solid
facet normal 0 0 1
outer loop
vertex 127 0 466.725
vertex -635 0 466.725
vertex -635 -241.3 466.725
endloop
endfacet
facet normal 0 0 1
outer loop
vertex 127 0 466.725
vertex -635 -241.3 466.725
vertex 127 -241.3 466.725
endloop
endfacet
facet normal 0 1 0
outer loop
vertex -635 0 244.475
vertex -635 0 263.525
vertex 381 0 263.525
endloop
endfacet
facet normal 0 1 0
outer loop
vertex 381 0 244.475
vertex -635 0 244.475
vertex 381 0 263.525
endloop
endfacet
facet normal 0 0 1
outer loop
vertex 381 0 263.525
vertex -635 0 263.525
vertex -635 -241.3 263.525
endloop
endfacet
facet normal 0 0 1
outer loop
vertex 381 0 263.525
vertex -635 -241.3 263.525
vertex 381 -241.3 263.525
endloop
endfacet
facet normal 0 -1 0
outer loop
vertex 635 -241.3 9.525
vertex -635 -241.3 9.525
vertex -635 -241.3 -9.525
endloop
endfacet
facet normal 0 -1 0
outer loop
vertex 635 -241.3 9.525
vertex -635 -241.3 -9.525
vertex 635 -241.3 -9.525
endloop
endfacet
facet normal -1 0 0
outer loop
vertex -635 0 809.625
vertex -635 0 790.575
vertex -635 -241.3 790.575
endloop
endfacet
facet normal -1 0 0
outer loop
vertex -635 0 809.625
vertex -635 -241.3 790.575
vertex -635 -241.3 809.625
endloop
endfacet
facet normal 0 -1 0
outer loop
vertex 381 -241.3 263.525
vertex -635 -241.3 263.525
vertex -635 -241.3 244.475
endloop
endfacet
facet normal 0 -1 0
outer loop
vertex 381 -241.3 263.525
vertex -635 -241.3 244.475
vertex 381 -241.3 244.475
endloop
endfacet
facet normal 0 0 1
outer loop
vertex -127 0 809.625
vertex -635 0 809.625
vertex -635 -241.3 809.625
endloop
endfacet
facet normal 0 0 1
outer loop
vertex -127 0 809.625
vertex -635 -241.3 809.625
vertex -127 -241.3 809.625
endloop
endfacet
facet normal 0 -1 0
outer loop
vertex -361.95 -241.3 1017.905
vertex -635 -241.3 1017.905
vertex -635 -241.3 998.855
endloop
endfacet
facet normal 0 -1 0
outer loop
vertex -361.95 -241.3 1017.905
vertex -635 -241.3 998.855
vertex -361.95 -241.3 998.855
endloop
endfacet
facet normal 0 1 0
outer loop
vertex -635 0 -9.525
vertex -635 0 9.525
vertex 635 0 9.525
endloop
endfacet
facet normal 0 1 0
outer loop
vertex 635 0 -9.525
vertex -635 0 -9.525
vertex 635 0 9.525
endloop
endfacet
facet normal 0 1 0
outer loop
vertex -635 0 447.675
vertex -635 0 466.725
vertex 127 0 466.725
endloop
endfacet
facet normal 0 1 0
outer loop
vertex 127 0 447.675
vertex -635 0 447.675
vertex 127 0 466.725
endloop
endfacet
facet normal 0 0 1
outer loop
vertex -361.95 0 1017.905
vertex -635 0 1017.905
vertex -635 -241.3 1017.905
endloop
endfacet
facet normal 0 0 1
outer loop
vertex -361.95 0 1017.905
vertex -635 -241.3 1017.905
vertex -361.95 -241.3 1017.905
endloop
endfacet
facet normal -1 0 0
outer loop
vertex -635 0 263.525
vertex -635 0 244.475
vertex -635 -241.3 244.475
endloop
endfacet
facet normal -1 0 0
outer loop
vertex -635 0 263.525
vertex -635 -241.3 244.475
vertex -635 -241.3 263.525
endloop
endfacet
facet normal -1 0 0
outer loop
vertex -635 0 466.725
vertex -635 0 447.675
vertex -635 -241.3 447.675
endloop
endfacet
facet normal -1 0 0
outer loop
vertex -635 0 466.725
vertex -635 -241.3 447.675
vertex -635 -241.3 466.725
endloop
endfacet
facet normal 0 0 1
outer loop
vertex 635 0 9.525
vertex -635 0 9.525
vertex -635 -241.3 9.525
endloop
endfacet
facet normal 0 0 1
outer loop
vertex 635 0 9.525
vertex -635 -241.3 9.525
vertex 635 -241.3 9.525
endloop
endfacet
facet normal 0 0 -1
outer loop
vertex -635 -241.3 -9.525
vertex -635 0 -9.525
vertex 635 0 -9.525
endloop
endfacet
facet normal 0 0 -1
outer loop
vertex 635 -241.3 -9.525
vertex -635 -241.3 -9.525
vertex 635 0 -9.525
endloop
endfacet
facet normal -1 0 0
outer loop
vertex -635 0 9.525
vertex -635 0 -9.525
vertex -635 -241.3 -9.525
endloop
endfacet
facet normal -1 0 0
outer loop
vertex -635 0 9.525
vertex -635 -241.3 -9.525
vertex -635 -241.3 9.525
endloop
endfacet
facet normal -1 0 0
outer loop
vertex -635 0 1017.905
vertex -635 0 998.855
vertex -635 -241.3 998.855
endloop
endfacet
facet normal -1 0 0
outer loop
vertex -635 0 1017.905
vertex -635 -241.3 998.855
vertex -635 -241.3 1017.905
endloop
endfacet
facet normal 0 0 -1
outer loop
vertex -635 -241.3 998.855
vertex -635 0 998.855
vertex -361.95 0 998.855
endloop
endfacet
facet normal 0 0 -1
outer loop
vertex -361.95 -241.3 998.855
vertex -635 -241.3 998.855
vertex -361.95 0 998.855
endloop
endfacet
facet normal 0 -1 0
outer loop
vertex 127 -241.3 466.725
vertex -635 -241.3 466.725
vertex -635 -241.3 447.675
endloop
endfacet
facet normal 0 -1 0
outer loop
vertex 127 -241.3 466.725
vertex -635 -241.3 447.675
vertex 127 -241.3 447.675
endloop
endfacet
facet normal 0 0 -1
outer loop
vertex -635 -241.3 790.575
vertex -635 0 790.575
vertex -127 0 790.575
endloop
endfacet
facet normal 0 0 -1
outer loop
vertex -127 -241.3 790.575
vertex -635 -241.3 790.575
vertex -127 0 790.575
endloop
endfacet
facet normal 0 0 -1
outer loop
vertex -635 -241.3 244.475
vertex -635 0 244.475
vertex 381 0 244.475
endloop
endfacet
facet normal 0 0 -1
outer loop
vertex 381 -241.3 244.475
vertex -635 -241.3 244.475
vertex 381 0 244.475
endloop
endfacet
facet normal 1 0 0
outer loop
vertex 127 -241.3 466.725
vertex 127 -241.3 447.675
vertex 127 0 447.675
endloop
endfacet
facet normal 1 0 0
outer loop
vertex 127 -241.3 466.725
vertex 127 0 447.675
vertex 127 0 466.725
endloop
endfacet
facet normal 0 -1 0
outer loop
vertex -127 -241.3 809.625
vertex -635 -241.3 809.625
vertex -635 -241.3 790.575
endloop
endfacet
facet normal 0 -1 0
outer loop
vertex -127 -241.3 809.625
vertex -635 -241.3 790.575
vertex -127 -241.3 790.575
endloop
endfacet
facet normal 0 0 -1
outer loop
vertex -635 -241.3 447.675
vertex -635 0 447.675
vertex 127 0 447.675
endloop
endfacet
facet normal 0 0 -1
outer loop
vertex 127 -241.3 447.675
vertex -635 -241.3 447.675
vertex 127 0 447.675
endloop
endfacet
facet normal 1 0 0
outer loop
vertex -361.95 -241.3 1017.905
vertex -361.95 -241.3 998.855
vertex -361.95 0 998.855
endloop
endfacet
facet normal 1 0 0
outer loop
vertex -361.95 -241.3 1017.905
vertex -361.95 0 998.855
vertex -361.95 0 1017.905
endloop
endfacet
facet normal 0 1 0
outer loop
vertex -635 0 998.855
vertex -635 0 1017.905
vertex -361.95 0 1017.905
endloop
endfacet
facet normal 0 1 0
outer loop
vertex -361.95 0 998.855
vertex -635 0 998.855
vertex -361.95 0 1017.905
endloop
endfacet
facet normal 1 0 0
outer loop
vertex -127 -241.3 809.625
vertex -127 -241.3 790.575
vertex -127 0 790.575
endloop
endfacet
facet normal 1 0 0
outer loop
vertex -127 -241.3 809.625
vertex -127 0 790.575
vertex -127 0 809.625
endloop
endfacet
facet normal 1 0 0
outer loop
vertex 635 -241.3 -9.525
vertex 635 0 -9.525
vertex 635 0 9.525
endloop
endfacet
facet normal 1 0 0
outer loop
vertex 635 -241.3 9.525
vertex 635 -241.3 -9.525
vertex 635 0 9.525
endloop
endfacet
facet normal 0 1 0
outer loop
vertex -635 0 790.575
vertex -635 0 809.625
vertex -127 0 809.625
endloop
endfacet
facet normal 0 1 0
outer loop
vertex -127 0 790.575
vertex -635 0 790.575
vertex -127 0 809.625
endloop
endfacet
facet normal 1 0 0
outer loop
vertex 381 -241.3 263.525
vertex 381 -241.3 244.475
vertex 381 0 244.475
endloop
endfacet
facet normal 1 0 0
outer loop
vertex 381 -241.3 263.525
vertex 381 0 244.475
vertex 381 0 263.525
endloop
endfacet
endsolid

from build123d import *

# Parameters (mm, degrees)
F0_W      = 1270
F0_H      = 19.05
F1_DEPTH  = 241.3
F3_W      = 254
F3_H      = 19.05
F4_DEPTH  = 241.301
F6_W      = 254
F6_H      = 19.05
F7_DEPTH  = 241.301
F9_W      = 254
F9_H      = 19.05
F10_DEPTH = 241.301
F12_W     = 234.95
F12_H     = 19.05
F13_DEPTH = 241.301


with BuildPart() as f1:
    # F0 (on Front) → F1 (new body)
    with BuildSketch(Plane.XZ):
        Rectangle(F0_W, F0_H)
    extrude(amount=F1_DEPTH)


with BuildPart() as f2_1:
    # F2: copy of F1
    add(f1.part.moved(Location((0, 0, 254))))

    # F3 (on face) → F4 (cut, through all)
    with BuildSketch(Plane.XZ.offset(241.3)):
        with Locations((508, 254)):
            Rectangle(F3_W, F3_H)
    extrude(amount=-F4_DEPTH, mode=Mode.SUBTRACT)


with BuildPart() as f5_1:
    # F5: copy of F2_1
    add(f2_1.part.moved(Location((0, 0, 203.2))))

    # F6 (on face) → F7 (cut, through all)
    with BuildSketch(Plane.XZ.offset(241.3)):
        with Locations((254, 457.2)):
            Rectangle(F6_W, F6_H)
    extrude(amount=-F7_DEPTH, mode=Mode.SUBTRACT)


with BuildPart() as f8_1:
    # F8: copy of F5_1
    add(f5_1.part.moved(Location((0, 0, 342.9))))

    # F9 (on face) → F10 (cut, through all)
    with BuildSketch(Plane.XZ.offset(241.3)):
        with Locations((0, 800.1)):
            Rectangle(F9_W, F9_H)
    extrude(amount=-F10_DEPTH, mode=Mode.SUBTRACT)


with BuildPart() as f11_1:
    # F11: copy of F8_1
    add(f8_1.part.moved(Location((0, 0, 208.28))))

    # F12 (on face) → F13 (cut, through all)
    with BuildSketch(Plane.XZ.offset(241.3)):
        with Locations((-244.475, 1008.38)):
            Rectangle(F12_W, F12_H)
    extrude(amount=-F13_DEPTH, mode=Mode.SUBTRACT)


solid = Compound([f1.part, f2_1.part, f5_1.part, f8_1.part, f11_1.part])
